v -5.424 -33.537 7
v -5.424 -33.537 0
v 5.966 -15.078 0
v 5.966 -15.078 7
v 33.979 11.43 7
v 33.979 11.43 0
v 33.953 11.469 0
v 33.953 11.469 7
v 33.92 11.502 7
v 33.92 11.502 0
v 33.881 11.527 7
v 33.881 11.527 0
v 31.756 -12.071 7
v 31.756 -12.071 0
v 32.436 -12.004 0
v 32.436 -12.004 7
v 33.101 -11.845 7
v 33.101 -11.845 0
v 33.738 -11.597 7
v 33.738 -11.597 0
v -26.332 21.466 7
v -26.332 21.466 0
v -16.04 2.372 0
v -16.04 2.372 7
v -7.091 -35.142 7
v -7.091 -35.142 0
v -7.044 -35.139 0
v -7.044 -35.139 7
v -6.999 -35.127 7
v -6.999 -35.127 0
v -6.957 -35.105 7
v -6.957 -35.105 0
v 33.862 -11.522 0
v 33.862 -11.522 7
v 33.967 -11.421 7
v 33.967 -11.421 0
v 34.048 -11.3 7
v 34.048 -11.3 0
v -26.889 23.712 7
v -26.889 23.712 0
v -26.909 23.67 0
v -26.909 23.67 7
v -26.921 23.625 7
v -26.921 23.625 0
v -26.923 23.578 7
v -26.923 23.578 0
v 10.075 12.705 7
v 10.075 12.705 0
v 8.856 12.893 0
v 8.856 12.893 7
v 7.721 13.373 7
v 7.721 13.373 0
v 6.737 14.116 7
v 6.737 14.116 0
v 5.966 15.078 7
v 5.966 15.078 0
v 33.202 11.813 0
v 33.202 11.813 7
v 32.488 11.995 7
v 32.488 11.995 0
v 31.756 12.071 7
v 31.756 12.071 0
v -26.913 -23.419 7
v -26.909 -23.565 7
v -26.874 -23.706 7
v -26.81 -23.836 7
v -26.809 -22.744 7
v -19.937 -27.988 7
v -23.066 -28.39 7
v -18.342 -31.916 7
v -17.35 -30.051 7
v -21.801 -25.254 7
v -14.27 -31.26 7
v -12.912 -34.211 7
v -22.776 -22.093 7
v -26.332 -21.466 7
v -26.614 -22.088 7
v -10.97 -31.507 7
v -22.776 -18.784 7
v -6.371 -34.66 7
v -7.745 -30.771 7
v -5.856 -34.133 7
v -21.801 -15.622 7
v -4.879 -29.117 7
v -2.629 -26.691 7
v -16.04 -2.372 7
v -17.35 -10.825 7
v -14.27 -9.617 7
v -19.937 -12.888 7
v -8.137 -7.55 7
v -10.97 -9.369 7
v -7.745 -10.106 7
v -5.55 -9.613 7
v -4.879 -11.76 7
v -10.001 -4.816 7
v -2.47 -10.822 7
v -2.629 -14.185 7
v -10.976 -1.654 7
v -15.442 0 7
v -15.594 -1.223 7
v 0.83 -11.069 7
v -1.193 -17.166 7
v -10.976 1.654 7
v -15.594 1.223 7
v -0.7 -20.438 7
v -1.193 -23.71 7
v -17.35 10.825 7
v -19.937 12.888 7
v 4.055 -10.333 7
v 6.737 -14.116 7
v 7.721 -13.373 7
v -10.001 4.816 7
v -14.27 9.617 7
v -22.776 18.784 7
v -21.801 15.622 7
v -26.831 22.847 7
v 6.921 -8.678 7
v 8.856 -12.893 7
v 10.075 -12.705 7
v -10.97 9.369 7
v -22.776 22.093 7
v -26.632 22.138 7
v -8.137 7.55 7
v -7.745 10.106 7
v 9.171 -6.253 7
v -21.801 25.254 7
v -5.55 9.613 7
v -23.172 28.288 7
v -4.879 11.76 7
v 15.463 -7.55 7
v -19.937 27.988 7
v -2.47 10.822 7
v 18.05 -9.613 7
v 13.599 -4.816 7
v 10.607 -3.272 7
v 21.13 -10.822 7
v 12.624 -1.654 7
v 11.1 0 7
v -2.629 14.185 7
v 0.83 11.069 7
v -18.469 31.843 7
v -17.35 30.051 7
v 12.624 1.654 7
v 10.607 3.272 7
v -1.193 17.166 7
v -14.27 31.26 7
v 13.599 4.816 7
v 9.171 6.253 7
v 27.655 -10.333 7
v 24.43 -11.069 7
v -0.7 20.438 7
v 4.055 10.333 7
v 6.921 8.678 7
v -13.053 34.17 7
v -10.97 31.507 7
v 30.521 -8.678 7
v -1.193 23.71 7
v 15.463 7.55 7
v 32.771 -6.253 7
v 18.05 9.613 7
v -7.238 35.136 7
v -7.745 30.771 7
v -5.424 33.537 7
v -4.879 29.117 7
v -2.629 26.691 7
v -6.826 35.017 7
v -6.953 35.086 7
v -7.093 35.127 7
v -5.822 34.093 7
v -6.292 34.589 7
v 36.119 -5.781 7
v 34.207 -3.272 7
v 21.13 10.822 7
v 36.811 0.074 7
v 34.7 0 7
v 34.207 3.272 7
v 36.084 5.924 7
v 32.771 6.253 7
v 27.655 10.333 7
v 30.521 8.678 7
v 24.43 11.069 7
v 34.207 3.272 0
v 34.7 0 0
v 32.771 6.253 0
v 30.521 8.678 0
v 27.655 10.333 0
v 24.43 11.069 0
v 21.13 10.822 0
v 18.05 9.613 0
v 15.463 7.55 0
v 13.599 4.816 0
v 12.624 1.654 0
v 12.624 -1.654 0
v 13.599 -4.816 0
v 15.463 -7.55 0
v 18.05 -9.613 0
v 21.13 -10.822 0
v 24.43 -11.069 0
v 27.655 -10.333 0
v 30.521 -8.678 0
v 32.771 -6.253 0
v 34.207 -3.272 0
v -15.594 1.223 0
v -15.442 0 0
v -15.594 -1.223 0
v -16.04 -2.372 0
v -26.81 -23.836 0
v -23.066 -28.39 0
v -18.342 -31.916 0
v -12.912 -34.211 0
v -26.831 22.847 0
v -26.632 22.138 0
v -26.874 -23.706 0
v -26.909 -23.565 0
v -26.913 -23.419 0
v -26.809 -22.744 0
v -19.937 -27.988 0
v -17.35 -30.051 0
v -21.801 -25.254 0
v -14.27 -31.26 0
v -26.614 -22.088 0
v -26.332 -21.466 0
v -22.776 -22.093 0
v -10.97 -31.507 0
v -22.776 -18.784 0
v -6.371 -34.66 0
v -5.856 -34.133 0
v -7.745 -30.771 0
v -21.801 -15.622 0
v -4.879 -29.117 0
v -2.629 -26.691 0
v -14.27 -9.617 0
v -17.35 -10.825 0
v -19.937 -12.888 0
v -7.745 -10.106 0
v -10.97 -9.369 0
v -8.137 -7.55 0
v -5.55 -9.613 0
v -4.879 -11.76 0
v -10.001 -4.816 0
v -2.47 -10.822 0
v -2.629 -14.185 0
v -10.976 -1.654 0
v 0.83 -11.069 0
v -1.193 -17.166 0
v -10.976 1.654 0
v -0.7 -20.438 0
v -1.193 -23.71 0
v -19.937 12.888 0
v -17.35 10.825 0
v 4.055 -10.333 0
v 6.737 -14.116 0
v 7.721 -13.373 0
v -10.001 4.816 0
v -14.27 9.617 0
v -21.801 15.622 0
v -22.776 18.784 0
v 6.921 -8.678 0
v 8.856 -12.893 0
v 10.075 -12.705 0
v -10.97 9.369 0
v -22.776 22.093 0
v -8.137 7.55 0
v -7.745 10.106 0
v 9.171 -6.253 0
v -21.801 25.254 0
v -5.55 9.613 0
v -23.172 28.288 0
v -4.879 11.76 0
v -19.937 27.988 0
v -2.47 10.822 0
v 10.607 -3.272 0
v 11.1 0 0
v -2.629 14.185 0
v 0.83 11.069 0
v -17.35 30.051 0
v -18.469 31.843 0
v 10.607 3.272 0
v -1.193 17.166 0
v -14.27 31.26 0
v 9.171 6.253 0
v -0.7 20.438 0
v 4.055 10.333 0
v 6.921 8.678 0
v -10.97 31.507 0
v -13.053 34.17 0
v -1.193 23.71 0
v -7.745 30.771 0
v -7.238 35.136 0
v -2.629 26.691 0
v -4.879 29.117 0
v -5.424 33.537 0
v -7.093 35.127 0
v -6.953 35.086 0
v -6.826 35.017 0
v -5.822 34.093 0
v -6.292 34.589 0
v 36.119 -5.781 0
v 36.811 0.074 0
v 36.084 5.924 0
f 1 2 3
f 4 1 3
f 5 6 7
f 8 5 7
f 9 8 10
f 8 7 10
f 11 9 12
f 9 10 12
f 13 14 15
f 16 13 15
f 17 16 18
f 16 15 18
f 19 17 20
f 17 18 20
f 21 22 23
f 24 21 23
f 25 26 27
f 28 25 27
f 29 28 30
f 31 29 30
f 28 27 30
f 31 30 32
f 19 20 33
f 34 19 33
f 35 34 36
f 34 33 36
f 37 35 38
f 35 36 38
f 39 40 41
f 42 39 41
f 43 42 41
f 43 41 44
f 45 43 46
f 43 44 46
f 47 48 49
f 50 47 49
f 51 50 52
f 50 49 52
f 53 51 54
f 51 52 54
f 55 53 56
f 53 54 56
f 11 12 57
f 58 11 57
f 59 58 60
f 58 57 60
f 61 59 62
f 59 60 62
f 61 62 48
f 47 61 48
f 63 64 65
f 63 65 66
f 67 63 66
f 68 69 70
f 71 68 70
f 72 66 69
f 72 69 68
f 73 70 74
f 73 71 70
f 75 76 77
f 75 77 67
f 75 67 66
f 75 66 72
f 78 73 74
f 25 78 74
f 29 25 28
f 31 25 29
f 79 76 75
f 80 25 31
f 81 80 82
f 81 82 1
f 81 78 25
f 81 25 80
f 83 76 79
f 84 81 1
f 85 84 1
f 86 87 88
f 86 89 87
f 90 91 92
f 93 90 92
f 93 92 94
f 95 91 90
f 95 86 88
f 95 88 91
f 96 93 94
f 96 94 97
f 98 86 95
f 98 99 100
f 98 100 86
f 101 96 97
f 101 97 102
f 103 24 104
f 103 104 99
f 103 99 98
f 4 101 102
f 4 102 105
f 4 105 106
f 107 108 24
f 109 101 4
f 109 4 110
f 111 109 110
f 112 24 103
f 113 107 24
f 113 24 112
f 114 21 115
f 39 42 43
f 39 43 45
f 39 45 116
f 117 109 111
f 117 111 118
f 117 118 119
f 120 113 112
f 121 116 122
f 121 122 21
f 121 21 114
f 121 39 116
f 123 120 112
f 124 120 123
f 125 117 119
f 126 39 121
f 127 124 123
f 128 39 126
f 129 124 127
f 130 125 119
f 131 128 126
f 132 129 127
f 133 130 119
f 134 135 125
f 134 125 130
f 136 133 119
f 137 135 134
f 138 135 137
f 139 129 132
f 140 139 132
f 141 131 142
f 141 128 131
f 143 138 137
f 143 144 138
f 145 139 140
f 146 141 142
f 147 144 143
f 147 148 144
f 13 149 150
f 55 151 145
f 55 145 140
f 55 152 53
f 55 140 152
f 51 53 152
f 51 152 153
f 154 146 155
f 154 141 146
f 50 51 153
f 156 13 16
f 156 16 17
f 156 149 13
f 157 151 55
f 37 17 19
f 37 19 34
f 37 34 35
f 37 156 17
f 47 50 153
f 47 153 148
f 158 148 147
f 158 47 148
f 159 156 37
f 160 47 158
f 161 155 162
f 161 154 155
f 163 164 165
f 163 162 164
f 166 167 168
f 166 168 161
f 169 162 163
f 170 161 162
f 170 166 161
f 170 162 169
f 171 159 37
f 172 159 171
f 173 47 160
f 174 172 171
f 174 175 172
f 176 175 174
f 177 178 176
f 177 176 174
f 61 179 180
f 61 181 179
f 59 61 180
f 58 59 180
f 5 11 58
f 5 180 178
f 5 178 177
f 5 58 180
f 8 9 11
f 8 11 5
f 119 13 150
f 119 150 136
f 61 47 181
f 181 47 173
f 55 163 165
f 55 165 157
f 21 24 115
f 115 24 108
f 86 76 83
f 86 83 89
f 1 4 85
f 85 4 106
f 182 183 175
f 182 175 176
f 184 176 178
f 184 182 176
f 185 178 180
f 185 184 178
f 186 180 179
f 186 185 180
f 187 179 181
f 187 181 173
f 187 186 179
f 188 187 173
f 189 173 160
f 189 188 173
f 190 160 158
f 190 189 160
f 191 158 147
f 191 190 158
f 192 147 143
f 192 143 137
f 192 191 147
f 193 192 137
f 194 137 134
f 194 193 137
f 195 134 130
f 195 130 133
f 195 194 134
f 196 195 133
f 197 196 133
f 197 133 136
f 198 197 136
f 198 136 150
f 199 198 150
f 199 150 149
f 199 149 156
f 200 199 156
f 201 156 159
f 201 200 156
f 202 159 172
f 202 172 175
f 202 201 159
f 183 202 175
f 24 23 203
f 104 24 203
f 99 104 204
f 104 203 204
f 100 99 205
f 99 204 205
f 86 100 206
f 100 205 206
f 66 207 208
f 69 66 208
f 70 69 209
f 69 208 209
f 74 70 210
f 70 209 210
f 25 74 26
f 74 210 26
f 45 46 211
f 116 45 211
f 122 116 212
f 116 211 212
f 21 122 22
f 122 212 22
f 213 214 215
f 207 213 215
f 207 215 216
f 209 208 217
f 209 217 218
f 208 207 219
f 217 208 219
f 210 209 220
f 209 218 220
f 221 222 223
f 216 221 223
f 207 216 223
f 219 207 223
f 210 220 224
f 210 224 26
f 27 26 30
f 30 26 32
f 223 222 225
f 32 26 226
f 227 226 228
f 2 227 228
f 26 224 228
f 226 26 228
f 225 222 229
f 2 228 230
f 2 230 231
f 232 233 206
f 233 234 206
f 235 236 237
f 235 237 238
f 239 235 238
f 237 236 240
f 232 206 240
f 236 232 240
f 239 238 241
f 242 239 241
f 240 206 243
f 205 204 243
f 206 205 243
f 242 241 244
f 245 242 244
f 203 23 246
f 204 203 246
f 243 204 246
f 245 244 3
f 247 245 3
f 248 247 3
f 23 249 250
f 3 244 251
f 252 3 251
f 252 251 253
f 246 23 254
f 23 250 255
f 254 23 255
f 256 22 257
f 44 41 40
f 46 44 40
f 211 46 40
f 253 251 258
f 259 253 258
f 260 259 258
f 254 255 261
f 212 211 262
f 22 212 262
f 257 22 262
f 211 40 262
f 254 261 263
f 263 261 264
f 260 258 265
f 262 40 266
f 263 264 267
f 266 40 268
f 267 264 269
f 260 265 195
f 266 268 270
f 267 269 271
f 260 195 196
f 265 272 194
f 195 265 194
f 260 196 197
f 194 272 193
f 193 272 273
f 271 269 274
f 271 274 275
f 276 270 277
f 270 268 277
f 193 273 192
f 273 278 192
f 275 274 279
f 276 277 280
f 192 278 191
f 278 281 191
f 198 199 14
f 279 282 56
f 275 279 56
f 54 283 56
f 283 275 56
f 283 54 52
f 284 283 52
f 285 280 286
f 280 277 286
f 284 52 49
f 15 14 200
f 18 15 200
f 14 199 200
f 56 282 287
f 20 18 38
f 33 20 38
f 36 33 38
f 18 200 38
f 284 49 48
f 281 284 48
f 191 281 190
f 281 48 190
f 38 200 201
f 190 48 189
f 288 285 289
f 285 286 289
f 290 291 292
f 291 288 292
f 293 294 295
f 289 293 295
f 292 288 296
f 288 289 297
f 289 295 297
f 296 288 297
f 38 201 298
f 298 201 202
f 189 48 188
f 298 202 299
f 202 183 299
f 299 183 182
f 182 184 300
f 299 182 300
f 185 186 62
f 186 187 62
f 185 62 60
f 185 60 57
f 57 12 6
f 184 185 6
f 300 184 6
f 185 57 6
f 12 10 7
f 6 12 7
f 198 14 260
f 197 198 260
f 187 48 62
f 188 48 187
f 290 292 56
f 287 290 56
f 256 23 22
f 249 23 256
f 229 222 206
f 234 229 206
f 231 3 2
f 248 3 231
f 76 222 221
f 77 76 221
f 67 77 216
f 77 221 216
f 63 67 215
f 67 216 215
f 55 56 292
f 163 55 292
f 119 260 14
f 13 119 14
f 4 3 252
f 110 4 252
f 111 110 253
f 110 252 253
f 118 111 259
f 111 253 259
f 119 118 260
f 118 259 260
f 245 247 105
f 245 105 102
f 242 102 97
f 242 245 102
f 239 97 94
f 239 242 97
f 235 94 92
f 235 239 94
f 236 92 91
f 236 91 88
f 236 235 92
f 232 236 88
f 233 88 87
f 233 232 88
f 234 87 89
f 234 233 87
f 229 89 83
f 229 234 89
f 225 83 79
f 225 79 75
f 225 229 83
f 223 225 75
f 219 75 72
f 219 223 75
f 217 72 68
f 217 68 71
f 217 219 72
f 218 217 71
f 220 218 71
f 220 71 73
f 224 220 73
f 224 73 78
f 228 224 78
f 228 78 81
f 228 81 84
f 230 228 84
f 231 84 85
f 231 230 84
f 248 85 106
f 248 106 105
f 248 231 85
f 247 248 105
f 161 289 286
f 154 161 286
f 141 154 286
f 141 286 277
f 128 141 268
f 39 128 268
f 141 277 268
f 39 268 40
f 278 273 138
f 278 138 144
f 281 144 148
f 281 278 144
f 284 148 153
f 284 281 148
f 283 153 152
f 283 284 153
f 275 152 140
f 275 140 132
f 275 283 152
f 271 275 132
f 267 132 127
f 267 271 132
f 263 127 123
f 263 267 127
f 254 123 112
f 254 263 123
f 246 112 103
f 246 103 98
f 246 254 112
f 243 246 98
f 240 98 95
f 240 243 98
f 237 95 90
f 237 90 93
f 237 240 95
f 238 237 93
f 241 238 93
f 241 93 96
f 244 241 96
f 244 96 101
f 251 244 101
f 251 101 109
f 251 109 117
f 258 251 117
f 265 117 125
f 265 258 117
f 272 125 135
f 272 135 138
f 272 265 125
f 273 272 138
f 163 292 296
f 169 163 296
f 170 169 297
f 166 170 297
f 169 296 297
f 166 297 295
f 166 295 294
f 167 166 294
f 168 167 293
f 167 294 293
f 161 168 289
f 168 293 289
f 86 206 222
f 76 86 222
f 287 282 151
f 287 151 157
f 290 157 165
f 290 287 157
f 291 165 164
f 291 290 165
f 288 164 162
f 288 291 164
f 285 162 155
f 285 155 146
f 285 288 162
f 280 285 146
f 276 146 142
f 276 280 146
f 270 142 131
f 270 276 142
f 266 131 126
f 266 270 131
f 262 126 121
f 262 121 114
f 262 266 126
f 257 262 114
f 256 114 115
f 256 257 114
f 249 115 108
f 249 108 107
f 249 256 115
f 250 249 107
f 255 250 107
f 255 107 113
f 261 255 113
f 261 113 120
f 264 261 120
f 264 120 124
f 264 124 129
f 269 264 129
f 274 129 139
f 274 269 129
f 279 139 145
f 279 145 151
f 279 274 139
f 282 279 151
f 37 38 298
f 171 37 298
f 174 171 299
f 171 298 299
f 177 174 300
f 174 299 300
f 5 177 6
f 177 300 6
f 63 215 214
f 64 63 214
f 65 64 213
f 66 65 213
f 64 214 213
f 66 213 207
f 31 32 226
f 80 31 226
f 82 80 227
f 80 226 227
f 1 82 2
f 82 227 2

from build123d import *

# Parameters (mm, degrees)
F0_R     = 11.1
F1_DEPTH = 7


with BuildPart() as f1:
    # F0 (on Top) → F1 (new body)
    with BuildSketch(Plane.XY):
        with BuildLine():
            Line((10.074664, -12.705239), (31.75576, -12.070901))
            ThreePointArc((31.75576, -12.070901), (32.771356, -11.936183), (33.738175, -11.597295))
            ThreePointArc((33.738175, -11.597295), (33.917325, -11.474048), (34.047629, -11.299963))
            ThreePointArc((34.047629, -11.299963), (36.811106, 0.073562), (33.979335, 11.430276))
            ThreePointArc((33.979335, 11.430276), (33.937596, 11.486441), (33.880845, 11.52738))
            ThreePointArc((33.880845, 11.52738), (32.848475, 11.91711), (31.75576, 12.070901))
            Line((31.75576, 12.070901), (10.074664, 12.705239))
            ThreePointArc((10.074664, 12.705239), (7.72089, 13.372973), (5.965728, 15.077534))
            Line((5.965728, 15.077534), (-5.424174, 33.536745))
            ThreePointArc((-5.424174, 33.536745), (-6.04864, 34.348919), (-6.825536, 35.016764))
            ThreePointArc((-6.825536, 35.016764), (-7.021846, 35.110289), (-7.237759, 35.136093))
            ThreePointArc((-7.237759, 35.136093), (-18.46926, 31.842572), (-26.888577, 23.71183))
            ThreePointArc((-26.888577, 23.71183), (-26.916348, 23.6476), (-26.923426, 23.577983))
            ThreePointArc((-26.923426, 23.577983), (-26.744758, 22.489059), (-26.331587, 21.465845))
            Line((-26.331587, 21.465845), (-16.040392, 2.372295))
            ThreePointArc((-16.040392, 2.372295), (-15.441779, 0), (-16.040392, -2.372295))
            Line((-16.040392, -2.372295), (-26.331587, -21.465845))
            ThreePointArc((-26.331587, -21.465845), (-26.722716, -22.412736), (-26.91264, -23.41947))
            ThreePointArc((-26.91264, -23.41947), (-26.89548, -23.636242), (-26.80987, -23.83613))
            ThreePointArc((-26.80987, -23.83613), (-18.341846, -31.916134), (-7.090758, -35.142106))
            ThreePointArc((-7.090758, -35.142106), (-7.021248, -35.134041), (-6.957419, -35.105362))
            ThreePointArc((-6.957419, -35.105362), (-6.103717, -34.406169), (-5.424174, -33.536745))
            Line((-5.424174, -33.536745), (5.965728, -15.077534))
            ThreePointArc((5.965728, -15.077534), (7.72089, -13.372973), (10.074664, -12.705239))
        make_face()
        with Locations((-11.8, -20.4382)):
            Circle(F0_R, mode=Mode.SUBTRACT)
        Circle(F0_R, mode=Mode.SUBTRACT)
        with Locations((-11.8, 20.4382)):
            Circle(F0_R, mode=Mode.SUBTRACT)
        with Locations((23.6, 0)):
            Circle(F0_R, mode=Mode.SUBTRACT)
    extrude(amount=F1_DEPTH)


solid = f1.part
